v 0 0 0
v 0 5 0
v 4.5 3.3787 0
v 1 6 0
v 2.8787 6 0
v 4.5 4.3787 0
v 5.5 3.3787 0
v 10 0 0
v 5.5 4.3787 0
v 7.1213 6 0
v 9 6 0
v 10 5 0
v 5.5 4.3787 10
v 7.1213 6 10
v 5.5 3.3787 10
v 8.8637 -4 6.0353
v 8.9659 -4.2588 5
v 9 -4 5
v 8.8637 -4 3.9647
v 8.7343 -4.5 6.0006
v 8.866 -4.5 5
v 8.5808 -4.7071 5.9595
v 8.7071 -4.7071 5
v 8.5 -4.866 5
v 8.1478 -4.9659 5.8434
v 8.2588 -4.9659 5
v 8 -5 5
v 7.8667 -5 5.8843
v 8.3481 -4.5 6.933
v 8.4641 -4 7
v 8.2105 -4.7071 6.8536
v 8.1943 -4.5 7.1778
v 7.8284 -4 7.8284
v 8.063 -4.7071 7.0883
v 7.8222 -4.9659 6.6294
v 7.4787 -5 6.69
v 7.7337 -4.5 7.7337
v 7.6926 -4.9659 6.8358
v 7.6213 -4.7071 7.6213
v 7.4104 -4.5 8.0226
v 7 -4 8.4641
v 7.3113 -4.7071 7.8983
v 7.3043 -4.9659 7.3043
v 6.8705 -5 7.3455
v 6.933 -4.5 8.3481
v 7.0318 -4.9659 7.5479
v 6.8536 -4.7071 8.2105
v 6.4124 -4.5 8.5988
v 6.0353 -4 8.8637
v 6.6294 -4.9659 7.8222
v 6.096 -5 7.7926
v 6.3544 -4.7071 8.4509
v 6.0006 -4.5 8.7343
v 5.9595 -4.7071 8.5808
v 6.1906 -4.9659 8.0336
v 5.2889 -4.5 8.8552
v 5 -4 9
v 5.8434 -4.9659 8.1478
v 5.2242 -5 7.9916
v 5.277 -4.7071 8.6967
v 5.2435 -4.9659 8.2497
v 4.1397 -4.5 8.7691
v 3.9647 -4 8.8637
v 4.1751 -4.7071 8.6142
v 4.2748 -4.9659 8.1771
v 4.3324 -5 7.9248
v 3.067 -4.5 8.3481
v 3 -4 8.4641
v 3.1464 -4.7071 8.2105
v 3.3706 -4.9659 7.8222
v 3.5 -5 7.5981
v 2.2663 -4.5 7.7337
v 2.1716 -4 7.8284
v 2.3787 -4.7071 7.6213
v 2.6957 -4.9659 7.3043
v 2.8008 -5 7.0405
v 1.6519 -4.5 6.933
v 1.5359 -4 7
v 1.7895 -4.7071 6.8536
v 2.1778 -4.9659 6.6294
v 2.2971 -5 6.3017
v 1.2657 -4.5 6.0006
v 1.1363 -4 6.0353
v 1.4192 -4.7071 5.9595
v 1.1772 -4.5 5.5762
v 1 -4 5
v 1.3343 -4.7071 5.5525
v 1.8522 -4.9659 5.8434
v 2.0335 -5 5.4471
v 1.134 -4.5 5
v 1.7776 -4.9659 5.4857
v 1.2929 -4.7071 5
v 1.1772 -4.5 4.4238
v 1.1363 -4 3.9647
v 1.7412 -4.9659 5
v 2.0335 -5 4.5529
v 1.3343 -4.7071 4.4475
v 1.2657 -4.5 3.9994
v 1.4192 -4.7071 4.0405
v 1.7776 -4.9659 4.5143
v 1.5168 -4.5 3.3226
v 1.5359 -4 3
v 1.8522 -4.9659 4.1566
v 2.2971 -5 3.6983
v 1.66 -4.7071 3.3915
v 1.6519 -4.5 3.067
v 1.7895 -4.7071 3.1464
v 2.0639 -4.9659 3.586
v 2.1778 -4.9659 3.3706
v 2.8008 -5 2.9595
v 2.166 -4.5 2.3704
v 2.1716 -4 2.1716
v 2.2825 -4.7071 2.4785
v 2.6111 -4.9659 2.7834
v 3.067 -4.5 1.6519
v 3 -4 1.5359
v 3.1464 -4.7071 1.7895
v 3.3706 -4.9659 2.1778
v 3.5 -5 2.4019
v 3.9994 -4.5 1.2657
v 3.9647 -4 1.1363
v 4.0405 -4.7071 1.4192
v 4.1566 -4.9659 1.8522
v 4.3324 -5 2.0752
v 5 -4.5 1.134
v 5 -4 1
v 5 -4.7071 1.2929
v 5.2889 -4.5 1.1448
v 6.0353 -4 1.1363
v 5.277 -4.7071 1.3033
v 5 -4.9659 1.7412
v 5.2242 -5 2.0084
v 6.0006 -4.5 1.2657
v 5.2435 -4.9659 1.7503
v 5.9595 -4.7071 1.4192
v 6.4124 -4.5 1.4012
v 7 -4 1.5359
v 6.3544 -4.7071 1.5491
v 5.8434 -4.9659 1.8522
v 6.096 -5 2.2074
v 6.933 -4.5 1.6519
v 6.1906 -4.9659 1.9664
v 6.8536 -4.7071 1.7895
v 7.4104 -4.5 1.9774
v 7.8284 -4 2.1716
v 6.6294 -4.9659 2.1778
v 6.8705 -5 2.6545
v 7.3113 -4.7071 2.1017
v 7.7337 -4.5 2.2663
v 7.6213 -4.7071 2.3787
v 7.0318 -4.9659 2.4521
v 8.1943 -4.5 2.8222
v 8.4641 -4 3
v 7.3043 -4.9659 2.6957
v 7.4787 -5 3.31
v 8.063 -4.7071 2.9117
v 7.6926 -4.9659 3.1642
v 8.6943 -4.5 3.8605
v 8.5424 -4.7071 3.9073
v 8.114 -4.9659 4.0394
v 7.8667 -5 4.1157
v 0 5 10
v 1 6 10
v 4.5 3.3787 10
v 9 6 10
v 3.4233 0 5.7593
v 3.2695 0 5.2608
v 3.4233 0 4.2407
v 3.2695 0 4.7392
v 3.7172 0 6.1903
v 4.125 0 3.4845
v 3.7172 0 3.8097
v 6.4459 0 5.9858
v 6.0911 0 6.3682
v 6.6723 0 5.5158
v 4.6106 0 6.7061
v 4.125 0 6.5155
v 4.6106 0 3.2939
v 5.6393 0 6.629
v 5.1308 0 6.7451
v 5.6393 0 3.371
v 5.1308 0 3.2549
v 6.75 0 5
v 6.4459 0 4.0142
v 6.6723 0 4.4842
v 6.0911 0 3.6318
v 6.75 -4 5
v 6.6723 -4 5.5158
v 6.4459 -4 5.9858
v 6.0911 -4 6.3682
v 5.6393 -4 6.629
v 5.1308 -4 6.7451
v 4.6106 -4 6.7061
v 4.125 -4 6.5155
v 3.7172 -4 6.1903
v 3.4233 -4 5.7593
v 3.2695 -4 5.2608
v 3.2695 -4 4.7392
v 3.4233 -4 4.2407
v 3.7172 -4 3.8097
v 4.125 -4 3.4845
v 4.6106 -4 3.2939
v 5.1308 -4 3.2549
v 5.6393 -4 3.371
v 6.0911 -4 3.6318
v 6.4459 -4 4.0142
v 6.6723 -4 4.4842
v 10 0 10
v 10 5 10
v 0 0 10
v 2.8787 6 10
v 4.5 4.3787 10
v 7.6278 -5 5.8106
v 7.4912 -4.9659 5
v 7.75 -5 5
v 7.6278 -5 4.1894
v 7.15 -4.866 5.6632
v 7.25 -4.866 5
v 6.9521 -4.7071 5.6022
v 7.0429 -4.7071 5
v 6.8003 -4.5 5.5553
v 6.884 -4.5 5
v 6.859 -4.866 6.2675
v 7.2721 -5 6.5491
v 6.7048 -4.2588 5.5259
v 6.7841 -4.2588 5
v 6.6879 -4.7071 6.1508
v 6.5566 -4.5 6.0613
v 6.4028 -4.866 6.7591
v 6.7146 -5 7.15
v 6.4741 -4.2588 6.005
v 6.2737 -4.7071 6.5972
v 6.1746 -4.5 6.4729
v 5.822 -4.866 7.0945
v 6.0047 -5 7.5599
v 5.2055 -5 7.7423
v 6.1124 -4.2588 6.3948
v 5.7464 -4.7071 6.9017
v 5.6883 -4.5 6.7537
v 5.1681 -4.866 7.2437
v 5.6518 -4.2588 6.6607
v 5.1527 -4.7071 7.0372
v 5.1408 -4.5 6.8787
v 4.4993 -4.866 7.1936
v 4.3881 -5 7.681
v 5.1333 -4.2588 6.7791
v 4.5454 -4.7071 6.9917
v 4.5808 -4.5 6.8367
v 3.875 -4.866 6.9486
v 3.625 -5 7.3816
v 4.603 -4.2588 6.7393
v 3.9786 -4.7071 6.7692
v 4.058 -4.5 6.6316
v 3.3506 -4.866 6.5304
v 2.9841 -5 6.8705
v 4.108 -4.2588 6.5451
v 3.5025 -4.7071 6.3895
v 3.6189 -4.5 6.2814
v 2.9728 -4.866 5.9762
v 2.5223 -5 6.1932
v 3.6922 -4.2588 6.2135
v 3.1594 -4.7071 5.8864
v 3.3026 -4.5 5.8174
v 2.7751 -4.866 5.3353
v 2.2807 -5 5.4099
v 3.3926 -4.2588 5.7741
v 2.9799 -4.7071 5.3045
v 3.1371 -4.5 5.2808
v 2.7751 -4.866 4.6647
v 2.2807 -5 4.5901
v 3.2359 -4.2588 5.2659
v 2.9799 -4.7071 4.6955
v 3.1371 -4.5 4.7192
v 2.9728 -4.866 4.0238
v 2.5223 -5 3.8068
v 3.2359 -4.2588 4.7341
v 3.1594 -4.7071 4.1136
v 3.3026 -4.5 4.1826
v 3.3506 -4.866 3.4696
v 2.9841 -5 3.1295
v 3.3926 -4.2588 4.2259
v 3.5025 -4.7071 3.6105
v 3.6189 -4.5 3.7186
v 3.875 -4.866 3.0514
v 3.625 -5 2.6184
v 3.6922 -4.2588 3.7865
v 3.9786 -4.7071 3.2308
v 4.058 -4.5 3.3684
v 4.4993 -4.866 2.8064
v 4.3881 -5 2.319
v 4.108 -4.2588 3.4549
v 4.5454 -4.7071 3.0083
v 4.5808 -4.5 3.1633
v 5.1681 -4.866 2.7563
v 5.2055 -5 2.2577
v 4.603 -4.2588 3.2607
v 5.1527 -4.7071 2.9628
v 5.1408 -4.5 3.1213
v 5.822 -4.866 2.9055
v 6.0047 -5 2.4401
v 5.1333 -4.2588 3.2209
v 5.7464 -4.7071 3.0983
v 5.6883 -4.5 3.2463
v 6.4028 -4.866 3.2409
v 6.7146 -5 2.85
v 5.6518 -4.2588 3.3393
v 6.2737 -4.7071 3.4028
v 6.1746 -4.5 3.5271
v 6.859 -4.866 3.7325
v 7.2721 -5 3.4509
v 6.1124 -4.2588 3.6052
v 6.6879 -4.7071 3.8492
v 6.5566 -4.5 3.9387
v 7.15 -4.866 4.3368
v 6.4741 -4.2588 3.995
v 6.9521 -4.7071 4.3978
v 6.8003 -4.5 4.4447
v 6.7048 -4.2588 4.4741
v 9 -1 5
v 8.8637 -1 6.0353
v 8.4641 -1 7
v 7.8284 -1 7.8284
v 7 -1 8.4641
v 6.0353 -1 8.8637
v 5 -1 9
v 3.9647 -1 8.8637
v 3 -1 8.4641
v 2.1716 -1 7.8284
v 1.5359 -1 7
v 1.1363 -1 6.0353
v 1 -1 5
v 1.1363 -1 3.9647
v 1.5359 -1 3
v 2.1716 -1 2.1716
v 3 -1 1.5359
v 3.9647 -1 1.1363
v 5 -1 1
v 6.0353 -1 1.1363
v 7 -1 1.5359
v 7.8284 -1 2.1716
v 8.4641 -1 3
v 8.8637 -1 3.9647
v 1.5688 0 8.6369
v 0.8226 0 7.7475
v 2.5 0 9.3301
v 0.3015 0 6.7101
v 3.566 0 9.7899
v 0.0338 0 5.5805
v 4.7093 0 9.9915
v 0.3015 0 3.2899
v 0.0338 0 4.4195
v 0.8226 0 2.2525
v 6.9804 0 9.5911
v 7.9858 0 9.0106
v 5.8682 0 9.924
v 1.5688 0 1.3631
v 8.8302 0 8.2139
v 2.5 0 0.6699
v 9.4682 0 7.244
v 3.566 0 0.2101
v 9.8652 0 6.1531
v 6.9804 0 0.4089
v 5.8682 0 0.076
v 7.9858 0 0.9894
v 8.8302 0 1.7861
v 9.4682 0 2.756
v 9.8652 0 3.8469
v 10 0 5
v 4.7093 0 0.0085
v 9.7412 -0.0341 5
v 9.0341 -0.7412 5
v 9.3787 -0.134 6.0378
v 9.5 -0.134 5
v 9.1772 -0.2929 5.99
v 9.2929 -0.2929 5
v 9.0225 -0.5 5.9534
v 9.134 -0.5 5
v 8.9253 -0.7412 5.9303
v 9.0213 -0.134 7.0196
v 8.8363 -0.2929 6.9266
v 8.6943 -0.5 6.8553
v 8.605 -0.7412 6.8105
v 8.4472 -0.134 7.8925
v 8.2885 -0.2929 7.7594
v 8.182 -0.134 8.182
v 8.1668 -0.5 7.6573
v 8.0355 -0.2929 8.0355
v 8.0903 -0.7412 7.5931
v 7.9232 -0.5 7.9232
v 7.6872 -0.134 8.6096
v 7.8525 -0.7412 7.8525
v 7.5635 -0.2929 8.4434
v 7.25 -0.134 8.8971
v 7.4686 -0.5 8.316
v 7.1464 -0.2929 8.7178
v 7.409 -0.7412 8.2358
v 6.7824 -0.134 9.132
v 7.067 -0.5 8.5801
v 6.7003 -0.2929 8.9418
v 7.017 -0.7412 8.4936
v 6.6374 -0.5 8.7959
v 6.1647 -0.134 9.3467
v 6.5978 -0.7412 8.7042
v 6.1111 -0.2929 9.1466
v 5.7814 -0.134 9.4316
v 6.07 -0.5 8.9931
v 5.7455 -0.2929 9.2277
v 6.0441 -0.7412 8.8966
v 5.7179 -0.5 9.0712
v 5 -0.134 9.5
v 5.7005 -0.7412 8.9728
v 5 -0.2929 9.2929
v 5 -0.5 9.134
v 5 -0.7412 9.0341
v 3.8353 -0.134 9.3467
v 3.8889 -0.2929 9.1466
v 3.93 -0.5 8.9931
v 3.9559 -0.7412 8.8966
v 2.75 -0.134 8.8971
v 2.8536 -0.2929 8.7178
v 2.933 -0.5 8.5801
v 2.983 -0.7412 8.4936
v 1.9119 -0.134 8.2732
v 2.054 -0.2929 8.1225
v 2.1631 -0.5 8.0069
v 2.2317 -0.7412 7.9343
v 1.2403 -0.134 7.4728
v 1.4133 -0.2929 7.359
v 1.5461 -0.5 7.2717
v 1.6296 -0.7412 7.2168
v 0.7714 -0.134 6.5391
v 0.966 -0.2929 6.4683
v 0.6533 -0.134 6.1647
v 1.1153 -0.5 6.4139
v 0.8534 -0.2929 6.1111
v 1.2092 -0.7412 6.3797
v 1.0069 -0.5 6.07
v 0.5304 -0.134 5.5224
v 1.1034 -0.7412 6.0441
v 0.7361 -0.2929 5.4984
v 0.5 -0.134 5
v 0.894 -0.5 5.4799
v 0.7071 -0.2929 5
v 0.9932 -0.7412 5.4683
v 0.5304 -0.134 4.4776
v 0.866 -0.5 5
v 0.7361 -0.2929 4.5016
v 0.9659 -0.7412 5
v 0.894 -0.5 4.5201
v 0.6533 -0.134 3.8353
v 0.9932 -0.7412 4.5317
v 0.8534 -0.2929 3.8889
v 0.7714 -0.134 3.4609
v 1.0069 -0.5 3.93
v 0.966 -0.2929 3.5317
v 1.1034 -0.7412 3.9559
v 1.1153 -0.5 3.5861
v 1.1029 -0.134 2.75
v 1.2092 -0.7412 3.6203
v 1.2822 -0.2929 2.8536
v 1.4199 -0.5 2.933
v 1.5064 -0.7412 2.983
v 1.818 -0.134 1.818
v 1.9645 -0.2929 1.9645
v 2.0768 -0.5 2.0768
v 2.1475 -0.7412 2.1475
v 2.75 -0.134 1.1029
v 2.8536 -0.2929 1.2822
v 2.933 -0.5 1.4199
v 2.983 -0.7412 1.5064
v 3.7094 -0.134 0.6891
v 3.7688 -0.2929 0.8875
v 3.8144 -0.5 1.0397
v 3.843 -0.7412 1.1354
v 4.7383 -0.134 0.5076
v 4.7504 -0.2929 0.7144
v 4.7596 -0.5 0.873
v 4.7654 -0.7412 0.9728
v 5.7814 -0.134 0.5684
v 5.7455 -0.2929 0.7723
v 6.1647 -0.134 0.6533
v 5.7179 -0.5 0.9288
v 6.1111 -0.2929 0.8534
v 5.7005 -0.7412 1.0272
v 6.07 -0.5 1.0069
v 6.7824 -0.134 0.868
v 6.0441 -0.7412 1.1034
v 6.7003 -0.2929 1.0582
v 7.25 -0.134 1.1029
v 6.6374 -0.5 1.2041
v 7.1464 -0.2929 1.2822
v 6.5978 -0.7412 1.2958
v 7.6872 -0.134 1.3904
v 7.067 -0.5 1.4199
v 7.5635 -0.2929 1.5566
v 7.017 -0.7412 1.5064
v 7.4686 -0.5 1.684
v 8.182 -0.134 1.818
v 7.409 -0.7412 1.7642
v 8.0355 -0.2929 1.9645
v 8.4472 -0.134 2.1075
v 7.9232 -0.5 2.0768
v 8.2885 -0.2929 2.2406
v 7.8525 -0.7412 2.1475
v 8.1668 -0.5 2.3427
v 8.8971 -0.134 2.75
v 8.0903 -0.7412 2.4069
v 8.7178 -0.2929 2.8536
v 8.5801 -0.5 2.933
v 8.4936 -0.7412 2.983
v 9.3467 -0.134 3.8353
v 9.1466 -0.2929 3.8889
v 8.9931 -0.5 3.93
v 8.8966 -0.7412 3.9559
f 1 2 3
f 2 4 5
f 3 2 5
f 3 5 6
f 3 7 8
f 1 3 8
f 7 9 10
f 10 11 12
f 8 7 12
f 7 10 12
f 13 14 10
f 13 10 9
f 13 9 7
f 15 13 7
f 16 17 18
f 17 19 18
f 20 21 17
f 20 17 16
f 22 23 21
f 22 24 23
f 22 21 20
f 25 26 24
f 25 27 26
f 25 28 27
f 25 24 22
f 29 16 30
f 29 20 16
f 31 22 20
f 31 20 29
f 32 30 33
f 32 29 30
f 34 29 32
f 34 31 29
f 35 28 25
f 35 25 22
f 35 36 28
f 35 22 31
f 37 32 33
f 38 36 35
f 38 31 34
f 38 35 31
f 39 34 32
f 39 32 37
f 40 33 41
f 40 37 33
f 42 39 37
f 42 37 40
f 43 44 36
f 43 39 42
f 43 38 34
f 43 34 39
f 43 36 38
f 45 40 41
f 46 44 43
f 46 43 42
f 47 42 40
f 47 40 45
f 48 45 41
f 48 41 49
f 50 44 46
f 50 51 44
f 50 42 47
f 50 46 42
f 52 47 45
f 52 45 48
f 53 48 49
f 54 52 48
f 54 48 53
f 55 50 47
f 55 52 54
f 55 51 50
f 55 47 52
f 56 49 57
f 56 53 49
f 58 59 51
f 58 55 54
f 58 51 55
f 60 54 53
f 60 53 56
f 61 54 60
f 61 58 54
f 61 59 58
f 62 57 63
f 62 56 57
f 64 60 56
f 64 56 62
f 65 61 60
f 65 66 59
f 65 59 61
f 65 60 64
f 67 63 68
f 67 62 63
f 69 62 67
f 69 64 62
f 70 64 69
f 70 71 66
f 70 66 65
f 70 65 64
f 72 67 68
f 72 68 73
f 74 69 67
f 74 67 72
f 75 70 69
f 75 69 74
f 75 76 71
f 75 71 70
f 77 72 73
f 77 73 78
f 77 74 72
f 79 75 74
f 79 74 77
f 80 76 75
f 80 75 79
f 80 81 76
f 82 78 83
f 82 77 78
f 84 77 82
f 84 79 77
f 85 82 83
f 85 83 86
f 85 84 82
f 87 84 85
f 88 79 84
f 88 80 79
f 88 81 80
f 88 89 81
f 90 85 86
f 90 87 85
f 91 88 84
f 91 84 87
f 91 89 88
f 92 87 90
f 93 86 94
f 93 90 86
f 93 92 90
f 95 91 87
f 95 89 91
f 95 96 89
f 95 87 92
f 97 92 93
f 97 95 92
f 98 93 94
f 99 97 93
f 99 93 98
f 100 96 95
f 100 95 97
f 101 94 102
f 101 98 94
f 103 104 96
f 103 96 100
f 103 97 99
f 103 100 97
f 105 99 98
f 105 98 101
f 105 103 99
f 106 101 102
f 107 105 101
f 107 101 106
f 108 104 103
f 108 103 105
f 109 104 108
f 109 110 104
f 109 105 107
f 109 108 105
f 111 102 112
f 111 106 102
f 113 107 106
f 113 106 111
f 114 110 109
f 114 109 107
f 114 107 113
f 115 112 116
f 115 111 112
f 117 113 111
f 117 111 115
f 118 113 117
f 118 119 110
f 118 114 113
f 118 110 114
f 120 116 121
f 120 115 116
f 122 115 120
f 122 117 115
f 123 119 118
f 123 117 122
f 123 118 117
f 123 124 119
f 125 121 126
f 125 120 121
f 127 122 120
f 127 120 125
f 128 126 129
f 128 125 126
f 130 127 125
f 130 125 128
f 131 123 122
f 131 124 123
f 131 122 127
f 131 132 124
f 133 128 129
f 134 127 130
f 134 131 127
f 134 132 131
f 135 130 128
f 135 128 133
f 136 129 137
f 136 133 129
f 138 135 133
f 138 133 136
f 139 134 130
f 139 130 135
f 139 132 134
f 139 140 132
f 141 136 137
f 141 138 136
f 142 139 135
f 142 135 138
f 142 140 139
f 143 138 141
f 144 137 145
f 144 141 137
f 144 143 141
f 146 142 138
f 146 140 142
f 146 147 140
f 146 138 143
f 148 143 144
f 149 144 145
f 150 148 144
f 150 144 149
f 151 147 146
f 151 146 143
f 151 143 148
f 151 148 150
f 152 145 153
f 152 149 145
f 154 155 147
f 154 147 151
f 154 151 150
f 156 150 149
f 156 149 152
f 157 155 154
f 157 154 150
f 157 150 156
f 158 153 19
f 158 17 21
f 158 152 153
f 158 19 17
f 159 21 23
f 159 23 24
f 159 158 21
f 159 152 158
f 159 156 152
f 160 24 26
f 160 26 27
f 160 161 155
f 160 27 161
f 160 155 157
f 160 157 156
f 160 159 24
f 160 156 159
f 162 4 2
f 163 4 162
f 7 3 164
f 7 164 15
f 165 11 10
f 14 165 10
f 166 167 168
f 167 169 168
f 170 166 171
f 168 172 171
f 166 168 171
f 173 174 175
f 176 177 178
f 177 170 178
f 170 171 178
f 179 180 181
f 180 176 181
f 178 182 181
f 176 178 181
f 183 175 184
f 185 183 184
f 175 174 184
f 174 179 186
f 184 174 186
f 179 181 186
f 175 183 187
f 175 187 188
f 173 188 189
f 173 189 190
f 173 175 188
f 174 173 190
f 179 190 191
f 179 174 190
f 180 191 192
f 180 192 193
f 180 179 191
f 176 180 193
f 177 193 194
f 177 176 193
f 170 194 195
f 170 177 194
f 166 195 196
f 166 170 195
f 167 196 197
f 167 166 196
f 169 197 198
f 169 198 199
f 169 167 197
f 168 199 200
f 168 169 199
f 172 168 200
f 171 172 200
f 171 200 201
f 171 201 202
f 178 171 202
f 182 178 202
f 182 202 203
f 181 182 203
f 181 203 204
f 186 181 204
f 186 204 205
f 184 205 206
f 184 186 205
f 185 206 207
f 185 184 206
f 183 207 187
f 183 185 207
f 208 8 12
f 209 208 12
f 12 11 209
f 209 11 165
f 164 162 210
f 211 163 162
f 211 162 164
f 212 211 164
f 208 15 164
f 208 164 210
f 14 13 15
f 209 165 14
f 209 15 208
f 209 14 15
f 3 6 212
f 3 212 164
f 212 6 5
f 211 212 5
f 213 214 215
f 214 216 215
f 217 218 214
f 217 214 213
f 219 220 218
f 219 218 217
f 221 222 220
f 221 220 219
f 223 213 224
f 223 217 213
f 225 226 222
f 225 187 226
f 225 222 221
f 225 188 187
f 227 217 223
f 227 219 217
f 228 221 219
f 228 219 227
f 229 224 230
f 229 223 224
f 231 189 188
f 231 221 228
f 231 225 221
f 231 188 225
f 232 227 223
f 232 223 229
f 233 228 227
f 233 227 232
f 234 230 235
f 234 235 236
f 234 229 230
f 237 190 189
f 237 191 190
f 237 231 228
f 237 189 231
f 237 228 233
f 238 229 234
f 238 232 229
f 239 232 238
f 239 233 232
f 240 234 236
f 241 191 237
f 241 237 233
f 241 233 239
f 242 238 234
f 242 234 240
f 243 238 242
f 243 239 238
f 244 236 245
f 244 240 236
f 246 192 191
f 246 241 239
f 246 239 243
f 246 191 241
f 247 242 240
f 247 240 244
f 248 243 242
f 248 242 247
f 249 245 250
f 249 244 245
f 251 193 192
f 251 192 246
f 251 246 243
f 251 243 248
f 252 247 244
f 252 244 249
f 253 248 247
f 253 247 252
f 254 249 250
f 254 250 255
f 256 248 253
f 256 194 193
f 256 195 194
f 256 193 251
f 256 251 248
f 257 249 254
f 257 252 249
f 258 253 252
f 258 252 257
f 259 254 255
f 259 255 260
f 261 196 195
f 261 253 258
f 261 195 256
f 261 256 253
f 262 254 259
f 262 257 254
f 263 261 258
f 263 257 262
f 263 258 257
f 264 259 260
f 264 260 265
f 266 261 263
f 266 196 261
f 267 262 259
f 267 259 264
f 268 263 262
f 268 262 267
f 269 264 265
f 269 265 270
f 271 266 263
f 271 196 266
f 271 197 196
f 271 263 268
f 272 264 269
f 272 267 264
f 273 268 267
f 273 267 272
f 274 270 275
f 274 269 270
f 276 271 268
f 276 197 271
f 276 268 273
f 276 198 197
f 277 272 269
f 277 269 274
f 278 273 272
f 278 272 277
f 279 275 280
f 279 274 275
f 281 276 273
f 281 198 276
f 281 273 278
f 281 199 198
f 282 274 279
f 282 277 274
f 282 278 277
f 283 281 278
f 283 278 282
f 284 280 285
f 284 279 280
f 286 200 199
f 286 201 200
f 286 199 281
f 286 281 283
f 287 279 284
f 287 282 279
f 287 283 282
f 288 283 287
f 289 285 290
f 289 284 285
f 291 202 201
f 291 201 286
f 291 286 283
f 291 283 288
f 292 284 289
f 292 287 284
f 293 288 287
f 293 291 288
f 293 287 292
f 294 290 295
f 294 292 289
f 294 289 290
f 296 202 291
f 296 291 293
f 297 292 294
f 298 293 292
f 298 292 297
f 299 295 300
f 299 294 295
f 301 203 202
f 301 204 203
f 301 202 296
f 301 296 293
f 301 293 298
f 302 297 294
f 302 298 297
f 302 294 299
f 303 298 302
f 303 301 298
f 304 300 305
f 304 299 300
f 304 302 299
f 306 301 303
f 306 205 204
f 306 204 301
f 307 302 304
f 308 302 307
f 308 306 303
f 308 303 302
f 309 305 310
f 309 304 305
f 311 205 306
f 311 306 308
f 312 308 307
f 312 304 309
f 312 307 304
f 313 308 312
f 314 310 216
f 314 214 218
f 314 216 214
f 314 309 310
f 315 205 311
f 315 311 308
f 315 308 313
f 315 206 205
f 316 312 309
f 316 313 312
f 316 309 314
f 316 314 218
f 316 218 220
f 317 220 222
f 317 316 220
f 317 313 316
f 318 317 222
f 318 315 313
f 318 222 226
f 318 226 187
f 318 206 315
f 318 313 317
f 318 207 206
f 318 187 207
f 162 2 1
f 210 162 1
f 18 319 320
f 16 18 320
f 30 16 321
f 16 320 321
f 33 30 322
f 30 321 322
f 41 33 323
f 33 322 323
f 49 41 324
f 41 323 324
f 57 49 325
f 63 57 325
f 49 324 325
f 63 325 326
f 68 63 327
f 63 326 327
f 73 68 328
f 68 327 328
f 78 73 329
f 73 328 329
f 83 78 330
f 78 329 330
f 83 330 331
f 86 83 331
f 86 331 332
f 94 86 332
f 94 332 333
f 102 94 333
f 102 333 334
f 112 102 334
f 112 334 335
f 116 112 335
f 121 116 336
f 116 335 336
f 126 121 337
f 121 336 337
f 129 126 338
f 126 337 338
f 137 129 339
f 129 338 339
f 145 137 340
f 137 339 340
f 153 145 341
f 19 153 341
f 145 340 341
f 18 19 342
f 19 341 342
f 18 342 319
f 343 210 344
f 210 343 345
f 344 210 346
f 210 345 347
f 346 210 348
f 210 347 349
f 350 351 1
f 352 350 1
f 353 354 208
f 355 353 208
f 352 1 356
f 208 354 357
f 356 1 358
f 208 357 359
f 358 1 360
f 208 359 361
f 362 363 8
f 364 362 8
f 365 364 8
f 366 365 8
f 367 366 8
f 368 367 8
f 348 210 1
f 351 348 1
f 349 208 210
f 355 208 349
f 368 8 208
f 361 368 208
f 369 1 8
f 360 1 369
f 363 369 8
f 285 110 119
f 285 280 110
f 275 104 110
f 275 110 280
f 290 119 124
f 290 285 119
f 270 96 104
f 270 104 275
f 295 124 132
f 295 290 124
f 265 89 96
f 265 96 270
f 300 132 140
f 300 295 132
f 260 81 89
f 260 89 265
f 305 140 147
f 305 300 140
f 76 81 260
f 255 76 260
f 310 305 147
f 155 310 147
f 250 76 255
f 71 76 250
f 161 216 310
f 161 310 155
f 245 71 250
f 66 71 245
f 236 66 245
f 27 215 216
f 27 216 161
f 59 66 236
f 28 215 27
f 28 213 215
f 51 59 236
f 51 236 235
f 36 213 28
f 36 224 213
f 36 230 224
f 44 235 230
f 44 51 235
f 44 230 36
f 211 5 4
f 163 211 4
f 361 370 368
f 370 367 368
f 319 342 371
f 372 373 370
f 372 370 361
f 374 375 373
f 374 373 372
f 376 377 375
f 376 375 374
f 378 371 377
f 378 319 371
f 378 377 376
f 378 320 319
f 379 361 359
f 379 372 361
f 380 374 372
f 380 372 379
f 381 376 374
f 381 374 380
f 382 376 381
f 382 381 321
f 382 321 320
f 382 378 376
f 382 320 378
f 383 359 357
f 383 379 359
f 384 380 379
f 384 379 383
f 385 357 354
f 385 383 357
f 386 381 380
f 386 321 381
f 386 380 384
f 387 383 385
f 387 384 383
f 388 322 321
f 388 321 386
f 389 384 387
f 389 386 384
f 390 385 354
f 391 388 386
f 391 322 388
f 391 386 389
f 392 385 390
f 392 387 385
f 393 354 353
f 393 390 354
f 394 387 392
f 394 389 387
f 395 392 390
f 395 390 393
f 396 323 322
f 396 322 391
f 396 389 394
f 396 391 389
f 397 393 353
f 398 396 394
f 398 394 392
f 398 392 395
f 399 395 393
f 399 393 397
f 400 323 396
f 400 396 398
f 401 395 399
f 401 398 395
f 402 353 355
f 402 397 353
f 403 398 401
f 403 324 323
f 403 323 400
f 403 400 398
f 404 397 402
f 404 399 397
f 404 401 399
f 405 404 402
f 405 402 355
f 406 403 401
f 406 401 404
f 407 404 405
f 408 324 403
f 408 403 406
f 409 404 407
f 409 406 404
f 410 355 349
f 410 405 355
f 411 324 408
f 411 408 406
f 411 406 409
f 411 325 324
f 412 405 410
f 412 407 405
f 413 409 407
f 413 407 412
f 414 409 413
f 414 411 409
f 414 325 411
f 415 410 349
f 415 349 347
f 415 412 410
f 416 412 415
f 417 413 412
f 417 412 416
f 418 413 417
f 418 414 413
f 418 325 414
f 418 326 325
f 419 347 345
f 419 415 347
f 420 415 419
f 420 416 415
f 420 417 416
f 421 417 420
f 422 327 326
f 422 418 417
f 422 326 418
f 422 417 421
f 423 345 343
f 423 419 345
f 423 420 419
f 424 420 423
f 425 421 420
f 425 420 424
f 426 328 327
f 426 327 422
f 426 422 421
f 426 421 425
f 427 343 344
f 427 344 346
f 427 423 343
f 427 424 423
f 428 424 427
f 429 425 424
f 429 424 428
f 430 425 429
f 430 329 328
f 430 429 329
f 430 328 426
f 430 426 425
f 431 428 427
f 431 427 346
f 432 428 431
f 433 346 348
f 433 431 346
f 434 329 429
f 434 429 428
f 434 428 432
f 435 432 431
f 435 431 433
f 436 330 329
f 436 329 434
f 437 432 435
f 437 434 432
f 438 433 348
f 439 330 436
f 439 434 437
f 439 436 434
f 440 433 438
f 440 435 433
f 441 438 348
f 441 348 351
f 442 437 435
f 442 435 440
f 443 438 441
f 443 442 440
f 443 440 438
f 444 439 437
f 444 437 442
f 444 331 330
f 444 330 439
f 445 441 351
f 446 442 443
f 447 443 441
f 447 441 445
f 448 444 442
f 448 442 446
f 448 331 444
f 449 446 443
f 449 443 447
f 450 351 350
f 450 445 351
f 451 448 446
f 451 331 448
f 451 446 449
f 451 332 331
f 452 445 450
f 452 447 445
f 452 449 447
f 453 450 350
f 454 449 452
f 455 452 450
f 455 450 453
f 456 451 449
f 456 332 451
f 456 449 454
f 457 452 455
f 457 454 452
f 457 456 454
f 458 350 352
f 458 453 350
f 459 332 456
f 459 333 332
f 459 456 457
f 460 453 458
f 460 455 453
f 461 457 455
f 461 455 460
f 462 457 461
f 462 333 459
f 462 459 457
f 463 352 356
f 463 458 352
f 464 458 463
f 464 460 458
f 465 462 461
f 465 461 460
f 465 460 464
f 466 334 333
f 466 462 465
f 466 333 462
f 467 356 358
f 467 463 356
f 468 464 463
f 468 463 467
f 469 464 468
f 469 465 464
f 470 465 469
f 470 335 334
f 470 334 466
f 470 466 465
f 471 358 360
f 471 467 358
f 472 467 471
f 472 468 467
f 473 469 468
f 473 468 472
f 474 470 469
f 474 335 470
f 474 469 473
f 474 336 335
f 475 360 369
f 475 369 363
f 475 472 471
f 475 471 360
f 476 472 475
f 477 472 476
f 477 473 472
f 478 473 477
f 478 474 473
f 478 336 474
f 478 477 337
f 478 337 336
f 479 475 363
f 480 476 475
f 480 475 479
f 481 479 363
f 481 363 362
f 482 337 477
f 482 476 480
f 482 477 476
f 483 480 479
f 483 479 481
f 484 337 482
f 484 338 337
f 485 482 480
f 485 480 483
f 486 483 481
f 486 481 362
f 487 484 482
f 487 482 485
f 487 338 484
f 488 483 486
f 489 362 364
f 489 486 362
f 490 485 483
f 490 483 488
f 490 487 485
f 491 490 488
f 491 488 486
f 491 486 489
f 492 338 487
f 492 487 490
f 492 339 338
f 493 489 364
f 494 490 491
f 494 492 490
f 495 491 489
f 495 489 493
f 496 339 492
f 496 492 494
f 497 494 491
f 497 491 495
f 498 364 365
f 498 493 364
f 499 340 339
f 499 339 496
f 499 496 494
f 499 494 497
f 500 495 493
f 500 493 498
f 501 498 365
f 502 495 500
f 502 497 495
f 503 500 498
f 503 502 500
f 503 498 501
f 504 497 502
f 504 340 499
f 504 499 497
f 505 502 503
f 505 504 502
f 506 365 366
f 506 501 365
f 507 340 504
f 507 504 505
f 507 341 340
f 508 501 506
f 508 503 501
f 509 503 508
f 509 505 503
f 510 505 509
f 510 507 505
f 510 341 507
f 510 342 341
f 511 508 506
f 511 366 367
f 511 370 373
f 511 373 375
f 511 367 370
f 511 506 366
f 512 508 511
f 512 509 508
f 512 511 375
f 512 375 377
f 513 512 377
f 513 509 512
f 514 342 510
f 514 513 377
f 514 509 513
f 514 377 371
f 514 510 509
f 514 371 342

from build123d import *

# Parameters (mm, degrees)
F1_DEPTH = 10
F2_R     = 4
F2_R_2   = 1.75
F3_DEPTH = 5
F4_SIZE  = 1
F5_W     = 1
F5_H     = 2.3880545414
F6_DEPTH = 25
F7_R     = 0.99999


# Not quite as in the source:
# - a fillet or chamfer is up to 0.001 mm smaller than in the source, because OpenCascade refuses the exact size


with BuildPart() as f1:
    # F0 (on Top) → F1 (new body)
    with BuildSketch(Plane.XY):
        Polygon((0, 6), (0, 0), (10, 0), (10, 6), (7.1213203436, 6), (5, 3.8786796564), (2.8786796564, 6), align=None)
    extrude(amount=F1_DEPTH)

    # F2 (on face) → F3 (join)
    with BuildSketch(Plane.XZ):
        with Locations((5, 5)):
            Circle(F2_R)
        with Locations((5, 5)):
            Circle(F2_R_2, mode=Mode.SUBTRACT)
    extrude(amount=F3_DEPTH)

    # F4
    f4_edges = [f1.edges().sort_by_distance(p)[0] for p in [
        (10, 6, 5),
        (0, 6, 5),
    ]]
    chamfer(f4_edges, length=F4_SIZE)

    # F5 (on face) → F6 (cut)
    with BuildSketch(Plane(origin=(0, 0, 0), x_dir=(1, 0, 0), z_dir=(0, 0, -1))):
        with Locations((5, -4.5727069271)):
            Rectangle(F5_W, F5_H)
    extrude(amount=-F6_DEPTH, mode=Mode.SUBTRACT)

    # F7 (radius 1 in the source; OpenCascade refuses exactly that, so slightly less here)
    f7_edges = [f1.edges().sort_by_distance(p)[0] for p in [
        (1, 0, 5),
        (1, -5, 5),
        (3.25, -5, 5),
    ]]
    fillet(f7_edges, radius=F7_R)


solid = f1.part
